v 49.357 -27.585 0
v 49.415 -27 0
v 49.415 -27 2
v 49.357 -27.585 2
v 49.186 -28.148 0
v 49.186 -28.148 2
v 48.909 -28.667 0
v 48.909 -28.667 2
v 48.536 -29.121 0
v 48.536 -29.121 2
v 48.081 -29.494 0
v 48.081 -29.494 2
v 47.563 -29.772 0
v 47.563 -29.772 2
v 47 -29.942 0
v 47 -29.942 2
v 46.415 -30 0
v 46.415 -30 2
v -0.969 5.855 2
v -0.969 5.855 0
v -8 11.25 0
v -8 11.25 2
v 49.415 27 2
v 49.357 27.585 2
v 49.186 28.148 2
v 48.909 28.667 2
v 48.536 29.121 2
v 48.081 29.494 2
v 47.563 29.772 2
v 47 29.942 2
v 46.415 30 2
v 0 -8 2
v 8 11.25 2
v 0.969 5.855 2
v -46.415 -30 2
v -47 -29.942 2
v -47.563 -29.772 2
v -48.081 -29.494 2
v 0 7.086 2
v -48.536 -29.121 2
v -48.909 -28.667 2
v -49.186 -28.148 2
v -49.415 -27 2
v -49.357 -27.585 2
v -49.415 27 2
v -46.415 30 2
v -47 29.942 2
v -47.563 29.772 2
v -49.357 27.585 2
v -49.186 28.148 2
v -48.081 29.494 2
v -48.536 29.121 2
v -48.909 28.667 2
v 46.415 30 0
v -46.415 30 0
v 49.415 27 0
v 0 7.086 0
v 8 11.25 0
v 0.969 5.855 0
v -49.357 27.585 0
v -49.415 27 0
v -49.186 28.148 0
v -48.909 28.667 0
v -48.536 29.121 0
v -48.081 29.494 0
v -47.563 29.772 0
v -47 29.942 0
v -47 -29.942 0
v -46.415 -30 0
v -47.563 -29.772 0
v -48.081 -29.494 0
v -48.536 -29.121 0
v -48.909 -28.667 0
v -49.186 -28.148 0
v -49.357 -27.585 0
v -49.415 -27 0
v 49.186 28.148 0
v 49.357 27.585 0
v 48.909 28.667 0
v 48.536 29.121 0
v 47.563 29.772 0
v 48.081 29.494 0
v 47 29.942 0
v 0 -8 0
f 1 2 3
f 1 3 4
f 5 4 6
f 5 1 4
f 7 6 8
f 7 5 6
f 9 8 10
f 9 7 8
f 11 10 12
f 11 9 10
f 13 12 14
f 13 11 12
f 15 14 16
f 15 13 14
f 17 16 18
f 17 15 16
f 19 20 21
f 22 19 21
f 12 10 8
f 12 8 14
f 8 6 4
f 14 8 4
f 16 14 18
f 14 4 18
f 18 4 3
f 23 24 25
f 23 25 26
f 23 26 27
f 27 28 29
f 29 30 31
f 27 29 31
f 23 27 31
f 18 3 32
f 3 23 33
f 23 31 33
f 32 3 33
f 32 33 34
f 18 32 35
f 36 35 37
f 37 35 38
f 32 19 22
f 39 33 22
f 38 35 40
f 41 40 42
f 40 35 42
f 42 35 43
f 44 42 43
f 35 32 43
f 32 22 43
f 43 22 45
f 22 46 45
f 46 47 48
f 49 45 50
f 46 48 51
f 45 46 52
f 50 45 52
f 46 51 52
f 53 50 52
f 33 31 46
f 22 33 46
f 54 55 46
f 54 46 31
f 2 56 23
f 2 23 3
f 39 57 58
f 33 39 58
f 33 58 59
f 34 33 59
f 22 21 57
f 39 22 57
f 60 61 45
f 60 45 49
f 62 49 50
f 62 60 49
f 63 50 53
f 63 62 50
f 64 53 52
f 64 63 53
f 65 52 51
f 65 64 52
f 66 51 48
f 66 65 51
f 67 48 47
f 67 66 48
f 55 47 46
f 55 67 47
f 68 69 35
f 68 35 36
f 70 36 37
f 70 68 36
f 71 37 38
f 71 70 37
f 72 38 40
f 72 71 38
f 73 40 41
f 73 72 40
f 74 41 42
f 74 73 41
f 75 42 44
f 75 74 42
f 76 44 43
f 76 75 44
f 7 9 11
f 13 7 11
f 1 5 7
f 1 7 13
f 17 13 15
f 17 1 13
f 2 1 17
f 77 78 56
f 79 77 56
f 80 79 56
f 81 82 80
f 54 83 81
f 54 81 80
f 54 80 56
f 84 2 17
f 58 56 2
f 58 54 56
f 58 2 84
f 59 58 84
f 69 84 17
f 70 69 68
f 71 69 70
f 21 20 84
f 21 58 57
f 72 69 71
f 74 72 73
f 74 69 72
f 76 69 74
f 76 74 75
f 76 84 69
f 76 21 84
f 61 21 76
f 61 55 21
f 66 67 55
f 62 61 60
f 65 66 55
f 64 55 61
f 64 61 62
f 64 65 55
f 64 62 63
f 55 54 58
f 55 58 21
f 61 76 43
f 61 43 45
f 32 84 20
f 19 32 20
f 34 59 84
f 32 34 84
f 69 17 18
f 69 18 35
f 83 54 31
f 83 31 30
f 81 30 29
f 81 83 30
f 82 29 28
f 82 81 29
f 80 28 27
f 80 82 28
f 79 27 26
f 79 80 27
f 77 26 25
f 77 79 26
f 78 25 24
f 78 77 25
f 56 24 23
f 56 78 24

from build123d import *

# Parameters (mm, degrees)
EXTRUDE_1_DEPTH = 2


with BuildPart() as part:
    # 草图1 → 凸台-拉伸1 (new body)
    with BuildSketch(Plane.XY):
        with BuildLine():
            Line((-46.414552668, 30), (46.414552668, 30))
            ThreePointArc((46.414552668, 30), (48.535873012, 29.121320344), (49.414552668, 27))
            Line((49.414552668, 27), (49.414552668, -27))
            ThreePointArc((49.414552668, -27), (48.535873012, -29.121320344), (46.414552668, -30))
            Line((46.414552668, -30), (-46.414552668, -30))
            ThreePointArc((-46.414552668, -30), (-48.535873012, -29.121320344), (-49.414552668, -27))
            Line((-49.414552668, -27), (-49.414552668, 27))
            ThreePointArc((-49.414552668, 27), (-48.535873012, 29.121320344), (-46.414552668, 30))
        make_face()
        Polygon((0, -8), (-0.96882521, 5.854845987), (-8, 11.250056161), (0, 7.085519757), (8, 11.250056161), (0.96882521, 5.854845987), align=None, mode=Mode.SUBTRACT)
    extrude(amount=EXTRUDE_1_DEPTH)


solid = part.part
